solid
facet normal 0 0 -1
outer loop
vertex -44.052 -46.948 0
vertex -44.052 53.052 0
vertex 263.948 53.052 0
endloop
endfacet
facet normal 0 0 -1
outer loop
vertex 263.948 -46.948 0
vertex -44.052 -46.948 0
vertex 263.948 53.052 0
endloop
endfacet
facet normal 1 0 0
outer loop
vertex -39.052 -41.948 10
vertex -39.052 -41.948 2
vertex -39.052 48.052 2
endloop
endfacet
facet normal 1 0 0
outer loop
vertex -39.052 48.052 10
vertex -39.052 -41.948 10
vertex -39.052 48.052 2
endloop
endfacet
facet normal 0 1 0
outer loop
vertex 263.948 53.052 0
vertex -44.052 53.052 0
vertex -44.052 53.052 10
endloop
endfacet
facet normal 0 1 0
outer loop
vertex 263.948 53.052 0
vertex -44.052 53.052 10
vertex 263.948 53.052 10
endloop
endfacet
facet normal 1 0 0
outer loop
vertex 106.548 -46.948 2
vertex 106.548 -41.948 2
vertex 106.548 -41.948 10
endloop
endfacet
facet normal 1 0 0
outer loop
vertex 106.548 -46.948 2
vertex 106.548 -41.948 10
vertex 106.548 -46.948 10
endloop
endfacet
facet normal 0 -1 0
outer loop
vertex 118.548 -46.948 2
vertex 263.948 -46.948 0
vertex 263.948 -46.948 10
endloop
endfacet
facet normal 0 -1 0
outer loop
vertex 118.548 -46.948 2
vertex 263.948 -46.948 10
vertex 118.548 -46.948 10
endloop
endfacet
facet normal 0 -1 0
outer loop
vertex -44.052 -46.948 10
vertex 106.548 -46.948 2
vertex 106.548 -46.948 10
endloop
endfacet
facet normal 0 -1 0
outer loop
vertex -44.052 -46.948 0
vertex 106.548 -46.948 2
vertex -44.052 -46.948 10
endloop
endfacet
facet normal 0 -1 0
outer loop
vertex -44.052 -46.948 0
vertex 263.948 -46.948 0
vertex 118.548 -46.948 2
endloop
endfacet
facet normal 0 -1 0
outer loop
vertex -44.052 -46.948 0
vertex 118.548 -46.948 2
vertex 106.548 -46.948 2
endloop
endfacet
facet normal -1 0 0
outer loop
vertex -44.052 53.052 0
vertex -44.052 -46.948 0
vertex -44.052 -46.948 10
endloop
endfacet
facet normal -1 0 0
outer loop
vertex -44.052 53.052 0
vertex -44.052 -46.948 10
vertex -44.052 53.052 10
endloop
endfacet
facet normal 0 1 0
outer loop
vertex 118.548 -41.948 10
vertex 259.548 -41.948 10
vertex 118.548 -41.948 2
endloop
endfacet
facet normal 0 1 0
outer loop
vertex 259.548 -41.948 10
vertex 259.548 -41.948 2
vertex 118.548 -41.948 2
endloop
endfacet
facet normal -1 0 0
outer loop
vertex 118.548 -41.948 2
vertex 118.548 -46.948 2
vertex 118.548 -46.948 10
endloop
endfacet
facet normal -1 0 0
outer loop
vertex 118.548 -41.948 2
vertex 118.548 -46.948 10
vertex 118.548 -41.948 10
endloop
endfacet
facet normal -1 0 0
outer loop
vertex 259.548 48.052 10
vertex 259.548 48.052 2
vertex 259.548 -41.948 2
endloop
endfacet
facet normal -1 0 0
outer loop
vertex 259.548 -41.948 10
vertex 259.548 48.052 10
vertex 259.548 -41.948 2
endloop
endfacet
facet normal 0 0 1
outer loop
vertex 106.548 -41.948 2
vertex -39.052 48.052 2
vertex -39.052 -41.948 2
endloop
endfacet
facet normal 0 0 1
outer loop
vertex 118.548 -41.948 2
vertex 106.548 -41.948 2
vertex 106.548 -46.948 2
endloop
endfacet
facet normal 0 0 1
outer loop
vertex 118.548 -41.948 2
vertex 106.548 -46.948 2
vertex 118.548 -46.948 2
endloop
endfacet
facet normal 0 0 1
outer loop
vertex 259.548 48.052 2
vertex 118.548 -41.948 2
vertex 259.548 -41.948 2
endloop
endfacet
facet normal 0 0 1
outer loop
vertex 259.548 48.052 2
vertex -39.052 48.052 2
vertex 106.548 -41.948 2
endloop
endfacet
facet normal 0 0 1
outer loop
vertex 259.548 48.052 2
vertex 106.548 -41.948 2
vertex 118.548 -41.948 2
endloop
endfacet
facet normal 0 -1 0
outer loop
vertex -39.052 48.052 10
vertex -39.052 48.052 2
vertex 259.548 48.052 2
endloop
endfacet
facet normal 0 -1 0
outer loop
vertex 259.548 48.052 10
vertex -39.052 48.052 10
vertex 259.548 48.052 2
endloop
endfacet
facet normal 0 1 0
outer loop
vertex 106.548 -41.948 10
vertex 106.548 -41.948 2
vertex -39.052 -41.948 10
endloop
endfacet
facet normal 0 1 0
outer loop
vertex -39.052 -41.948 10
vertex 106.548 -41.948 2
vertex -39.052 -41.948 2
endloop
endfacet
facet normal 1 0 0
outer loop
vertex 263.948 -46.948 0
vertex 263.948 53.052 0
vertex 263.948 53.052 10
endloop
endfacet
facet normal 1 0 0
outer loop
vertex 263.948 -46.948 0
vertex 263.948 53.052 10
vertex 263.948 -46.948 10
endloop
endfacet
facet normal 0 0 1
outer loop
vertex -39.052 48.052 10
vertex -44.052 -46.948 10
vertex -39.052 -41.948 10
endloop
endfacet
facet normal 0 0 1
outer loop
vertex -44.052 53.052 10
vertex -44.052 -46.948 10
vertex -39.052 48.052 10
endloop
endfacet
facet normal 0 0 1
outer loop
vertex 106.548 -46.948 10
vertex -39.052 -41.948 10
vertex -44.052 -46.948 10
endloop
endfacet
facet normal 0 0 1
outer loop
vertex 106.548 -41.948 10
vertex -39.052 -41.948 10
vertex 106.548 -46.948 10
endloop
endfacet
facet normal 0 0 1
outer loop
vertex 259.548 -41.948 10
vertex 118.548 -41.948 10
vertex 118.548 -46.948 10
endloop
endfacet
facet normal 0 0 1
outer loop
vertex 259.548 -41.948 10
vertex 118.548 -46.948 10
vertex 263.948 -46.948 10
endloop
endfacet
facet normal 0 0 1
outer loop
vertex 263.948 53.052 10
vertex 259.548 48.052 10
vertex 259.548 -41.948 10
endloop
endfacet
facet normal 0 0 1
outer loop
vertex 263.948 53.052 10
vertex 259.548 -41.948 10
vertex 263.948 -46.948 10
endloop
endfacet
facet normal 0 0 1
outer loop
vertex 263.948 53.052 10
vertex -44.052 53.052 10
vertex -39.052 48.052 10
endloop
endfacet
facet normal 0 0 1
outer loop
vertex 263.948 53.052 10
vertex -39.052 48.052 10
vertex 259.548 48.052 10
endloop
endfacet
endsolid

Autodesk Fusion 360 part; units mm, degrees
sketch "Szkic1" plane through (0, 0, 0) normal (0, 0, 1) x (1, 0, 0)
  line L0 (-39.0522, 48.0519) -> (259.5478, 48.0519)
  line L1 (259.5478, 48.0519) -> (259.5478, -41.9481)
  line L2 (259.5478, -41.9481) -> (-39.0522, -41.9481)
  line L3 (-39.0522, -41.9481) -> (-39.0522, 48.0519)
  line L4 (-44.0522, 53.0519) -> (263.9478, 53.0519)
  line L5 (263.9478, 53.0519) -> (263.9478, -46.9481)
  line L6 (263.9478, -46.9481) -> (-44.0522, -46.9481)
  line L7 (-44.0522, -46.9481) -> (-44.0522, 53.0519)
  line L8 (118.5478, -41.9481) -> (106.5478, -41.9481)
  line L9 (106.5478, -41.9481) -> (106.5478, -46.9481)
  line L10 (106.5478, -46.9481) -> (118.5478, -46.9481)
  line L11 (118.5478, -46.9481) -> (118.5478, -41.9481)
  dimension "d1" = 298.6
  dimension "d2" = 90
  dimension "d3" = 308
  dimension "d4" = 100
  dimension "d5" = 5
  dimension "d6" = 5
  dimension "d7" = 141
  dimension "d8" = 12
extrude "Wyciągnięcie proste1" add sketch "Szkic1" along normal blind 5 contours L0 L1 L2 L3 L4 L5 L6 L7 L9 L11
extrude "Wyciągnięcie proste2" add sketch "Szkic1" along normal blind 2 contours L0 L1 L2 L3 L8
extrude "Wyciągnięcie proste3" add sketch "Szkic1" along normal blind 2 contours L2 L6 L8 L9 L10 L11
extrude "Wyciągnięcie proste4" add 1 faces at (60.2811, 51.3852, 5) along direction (0, 0, 1) blind 5
